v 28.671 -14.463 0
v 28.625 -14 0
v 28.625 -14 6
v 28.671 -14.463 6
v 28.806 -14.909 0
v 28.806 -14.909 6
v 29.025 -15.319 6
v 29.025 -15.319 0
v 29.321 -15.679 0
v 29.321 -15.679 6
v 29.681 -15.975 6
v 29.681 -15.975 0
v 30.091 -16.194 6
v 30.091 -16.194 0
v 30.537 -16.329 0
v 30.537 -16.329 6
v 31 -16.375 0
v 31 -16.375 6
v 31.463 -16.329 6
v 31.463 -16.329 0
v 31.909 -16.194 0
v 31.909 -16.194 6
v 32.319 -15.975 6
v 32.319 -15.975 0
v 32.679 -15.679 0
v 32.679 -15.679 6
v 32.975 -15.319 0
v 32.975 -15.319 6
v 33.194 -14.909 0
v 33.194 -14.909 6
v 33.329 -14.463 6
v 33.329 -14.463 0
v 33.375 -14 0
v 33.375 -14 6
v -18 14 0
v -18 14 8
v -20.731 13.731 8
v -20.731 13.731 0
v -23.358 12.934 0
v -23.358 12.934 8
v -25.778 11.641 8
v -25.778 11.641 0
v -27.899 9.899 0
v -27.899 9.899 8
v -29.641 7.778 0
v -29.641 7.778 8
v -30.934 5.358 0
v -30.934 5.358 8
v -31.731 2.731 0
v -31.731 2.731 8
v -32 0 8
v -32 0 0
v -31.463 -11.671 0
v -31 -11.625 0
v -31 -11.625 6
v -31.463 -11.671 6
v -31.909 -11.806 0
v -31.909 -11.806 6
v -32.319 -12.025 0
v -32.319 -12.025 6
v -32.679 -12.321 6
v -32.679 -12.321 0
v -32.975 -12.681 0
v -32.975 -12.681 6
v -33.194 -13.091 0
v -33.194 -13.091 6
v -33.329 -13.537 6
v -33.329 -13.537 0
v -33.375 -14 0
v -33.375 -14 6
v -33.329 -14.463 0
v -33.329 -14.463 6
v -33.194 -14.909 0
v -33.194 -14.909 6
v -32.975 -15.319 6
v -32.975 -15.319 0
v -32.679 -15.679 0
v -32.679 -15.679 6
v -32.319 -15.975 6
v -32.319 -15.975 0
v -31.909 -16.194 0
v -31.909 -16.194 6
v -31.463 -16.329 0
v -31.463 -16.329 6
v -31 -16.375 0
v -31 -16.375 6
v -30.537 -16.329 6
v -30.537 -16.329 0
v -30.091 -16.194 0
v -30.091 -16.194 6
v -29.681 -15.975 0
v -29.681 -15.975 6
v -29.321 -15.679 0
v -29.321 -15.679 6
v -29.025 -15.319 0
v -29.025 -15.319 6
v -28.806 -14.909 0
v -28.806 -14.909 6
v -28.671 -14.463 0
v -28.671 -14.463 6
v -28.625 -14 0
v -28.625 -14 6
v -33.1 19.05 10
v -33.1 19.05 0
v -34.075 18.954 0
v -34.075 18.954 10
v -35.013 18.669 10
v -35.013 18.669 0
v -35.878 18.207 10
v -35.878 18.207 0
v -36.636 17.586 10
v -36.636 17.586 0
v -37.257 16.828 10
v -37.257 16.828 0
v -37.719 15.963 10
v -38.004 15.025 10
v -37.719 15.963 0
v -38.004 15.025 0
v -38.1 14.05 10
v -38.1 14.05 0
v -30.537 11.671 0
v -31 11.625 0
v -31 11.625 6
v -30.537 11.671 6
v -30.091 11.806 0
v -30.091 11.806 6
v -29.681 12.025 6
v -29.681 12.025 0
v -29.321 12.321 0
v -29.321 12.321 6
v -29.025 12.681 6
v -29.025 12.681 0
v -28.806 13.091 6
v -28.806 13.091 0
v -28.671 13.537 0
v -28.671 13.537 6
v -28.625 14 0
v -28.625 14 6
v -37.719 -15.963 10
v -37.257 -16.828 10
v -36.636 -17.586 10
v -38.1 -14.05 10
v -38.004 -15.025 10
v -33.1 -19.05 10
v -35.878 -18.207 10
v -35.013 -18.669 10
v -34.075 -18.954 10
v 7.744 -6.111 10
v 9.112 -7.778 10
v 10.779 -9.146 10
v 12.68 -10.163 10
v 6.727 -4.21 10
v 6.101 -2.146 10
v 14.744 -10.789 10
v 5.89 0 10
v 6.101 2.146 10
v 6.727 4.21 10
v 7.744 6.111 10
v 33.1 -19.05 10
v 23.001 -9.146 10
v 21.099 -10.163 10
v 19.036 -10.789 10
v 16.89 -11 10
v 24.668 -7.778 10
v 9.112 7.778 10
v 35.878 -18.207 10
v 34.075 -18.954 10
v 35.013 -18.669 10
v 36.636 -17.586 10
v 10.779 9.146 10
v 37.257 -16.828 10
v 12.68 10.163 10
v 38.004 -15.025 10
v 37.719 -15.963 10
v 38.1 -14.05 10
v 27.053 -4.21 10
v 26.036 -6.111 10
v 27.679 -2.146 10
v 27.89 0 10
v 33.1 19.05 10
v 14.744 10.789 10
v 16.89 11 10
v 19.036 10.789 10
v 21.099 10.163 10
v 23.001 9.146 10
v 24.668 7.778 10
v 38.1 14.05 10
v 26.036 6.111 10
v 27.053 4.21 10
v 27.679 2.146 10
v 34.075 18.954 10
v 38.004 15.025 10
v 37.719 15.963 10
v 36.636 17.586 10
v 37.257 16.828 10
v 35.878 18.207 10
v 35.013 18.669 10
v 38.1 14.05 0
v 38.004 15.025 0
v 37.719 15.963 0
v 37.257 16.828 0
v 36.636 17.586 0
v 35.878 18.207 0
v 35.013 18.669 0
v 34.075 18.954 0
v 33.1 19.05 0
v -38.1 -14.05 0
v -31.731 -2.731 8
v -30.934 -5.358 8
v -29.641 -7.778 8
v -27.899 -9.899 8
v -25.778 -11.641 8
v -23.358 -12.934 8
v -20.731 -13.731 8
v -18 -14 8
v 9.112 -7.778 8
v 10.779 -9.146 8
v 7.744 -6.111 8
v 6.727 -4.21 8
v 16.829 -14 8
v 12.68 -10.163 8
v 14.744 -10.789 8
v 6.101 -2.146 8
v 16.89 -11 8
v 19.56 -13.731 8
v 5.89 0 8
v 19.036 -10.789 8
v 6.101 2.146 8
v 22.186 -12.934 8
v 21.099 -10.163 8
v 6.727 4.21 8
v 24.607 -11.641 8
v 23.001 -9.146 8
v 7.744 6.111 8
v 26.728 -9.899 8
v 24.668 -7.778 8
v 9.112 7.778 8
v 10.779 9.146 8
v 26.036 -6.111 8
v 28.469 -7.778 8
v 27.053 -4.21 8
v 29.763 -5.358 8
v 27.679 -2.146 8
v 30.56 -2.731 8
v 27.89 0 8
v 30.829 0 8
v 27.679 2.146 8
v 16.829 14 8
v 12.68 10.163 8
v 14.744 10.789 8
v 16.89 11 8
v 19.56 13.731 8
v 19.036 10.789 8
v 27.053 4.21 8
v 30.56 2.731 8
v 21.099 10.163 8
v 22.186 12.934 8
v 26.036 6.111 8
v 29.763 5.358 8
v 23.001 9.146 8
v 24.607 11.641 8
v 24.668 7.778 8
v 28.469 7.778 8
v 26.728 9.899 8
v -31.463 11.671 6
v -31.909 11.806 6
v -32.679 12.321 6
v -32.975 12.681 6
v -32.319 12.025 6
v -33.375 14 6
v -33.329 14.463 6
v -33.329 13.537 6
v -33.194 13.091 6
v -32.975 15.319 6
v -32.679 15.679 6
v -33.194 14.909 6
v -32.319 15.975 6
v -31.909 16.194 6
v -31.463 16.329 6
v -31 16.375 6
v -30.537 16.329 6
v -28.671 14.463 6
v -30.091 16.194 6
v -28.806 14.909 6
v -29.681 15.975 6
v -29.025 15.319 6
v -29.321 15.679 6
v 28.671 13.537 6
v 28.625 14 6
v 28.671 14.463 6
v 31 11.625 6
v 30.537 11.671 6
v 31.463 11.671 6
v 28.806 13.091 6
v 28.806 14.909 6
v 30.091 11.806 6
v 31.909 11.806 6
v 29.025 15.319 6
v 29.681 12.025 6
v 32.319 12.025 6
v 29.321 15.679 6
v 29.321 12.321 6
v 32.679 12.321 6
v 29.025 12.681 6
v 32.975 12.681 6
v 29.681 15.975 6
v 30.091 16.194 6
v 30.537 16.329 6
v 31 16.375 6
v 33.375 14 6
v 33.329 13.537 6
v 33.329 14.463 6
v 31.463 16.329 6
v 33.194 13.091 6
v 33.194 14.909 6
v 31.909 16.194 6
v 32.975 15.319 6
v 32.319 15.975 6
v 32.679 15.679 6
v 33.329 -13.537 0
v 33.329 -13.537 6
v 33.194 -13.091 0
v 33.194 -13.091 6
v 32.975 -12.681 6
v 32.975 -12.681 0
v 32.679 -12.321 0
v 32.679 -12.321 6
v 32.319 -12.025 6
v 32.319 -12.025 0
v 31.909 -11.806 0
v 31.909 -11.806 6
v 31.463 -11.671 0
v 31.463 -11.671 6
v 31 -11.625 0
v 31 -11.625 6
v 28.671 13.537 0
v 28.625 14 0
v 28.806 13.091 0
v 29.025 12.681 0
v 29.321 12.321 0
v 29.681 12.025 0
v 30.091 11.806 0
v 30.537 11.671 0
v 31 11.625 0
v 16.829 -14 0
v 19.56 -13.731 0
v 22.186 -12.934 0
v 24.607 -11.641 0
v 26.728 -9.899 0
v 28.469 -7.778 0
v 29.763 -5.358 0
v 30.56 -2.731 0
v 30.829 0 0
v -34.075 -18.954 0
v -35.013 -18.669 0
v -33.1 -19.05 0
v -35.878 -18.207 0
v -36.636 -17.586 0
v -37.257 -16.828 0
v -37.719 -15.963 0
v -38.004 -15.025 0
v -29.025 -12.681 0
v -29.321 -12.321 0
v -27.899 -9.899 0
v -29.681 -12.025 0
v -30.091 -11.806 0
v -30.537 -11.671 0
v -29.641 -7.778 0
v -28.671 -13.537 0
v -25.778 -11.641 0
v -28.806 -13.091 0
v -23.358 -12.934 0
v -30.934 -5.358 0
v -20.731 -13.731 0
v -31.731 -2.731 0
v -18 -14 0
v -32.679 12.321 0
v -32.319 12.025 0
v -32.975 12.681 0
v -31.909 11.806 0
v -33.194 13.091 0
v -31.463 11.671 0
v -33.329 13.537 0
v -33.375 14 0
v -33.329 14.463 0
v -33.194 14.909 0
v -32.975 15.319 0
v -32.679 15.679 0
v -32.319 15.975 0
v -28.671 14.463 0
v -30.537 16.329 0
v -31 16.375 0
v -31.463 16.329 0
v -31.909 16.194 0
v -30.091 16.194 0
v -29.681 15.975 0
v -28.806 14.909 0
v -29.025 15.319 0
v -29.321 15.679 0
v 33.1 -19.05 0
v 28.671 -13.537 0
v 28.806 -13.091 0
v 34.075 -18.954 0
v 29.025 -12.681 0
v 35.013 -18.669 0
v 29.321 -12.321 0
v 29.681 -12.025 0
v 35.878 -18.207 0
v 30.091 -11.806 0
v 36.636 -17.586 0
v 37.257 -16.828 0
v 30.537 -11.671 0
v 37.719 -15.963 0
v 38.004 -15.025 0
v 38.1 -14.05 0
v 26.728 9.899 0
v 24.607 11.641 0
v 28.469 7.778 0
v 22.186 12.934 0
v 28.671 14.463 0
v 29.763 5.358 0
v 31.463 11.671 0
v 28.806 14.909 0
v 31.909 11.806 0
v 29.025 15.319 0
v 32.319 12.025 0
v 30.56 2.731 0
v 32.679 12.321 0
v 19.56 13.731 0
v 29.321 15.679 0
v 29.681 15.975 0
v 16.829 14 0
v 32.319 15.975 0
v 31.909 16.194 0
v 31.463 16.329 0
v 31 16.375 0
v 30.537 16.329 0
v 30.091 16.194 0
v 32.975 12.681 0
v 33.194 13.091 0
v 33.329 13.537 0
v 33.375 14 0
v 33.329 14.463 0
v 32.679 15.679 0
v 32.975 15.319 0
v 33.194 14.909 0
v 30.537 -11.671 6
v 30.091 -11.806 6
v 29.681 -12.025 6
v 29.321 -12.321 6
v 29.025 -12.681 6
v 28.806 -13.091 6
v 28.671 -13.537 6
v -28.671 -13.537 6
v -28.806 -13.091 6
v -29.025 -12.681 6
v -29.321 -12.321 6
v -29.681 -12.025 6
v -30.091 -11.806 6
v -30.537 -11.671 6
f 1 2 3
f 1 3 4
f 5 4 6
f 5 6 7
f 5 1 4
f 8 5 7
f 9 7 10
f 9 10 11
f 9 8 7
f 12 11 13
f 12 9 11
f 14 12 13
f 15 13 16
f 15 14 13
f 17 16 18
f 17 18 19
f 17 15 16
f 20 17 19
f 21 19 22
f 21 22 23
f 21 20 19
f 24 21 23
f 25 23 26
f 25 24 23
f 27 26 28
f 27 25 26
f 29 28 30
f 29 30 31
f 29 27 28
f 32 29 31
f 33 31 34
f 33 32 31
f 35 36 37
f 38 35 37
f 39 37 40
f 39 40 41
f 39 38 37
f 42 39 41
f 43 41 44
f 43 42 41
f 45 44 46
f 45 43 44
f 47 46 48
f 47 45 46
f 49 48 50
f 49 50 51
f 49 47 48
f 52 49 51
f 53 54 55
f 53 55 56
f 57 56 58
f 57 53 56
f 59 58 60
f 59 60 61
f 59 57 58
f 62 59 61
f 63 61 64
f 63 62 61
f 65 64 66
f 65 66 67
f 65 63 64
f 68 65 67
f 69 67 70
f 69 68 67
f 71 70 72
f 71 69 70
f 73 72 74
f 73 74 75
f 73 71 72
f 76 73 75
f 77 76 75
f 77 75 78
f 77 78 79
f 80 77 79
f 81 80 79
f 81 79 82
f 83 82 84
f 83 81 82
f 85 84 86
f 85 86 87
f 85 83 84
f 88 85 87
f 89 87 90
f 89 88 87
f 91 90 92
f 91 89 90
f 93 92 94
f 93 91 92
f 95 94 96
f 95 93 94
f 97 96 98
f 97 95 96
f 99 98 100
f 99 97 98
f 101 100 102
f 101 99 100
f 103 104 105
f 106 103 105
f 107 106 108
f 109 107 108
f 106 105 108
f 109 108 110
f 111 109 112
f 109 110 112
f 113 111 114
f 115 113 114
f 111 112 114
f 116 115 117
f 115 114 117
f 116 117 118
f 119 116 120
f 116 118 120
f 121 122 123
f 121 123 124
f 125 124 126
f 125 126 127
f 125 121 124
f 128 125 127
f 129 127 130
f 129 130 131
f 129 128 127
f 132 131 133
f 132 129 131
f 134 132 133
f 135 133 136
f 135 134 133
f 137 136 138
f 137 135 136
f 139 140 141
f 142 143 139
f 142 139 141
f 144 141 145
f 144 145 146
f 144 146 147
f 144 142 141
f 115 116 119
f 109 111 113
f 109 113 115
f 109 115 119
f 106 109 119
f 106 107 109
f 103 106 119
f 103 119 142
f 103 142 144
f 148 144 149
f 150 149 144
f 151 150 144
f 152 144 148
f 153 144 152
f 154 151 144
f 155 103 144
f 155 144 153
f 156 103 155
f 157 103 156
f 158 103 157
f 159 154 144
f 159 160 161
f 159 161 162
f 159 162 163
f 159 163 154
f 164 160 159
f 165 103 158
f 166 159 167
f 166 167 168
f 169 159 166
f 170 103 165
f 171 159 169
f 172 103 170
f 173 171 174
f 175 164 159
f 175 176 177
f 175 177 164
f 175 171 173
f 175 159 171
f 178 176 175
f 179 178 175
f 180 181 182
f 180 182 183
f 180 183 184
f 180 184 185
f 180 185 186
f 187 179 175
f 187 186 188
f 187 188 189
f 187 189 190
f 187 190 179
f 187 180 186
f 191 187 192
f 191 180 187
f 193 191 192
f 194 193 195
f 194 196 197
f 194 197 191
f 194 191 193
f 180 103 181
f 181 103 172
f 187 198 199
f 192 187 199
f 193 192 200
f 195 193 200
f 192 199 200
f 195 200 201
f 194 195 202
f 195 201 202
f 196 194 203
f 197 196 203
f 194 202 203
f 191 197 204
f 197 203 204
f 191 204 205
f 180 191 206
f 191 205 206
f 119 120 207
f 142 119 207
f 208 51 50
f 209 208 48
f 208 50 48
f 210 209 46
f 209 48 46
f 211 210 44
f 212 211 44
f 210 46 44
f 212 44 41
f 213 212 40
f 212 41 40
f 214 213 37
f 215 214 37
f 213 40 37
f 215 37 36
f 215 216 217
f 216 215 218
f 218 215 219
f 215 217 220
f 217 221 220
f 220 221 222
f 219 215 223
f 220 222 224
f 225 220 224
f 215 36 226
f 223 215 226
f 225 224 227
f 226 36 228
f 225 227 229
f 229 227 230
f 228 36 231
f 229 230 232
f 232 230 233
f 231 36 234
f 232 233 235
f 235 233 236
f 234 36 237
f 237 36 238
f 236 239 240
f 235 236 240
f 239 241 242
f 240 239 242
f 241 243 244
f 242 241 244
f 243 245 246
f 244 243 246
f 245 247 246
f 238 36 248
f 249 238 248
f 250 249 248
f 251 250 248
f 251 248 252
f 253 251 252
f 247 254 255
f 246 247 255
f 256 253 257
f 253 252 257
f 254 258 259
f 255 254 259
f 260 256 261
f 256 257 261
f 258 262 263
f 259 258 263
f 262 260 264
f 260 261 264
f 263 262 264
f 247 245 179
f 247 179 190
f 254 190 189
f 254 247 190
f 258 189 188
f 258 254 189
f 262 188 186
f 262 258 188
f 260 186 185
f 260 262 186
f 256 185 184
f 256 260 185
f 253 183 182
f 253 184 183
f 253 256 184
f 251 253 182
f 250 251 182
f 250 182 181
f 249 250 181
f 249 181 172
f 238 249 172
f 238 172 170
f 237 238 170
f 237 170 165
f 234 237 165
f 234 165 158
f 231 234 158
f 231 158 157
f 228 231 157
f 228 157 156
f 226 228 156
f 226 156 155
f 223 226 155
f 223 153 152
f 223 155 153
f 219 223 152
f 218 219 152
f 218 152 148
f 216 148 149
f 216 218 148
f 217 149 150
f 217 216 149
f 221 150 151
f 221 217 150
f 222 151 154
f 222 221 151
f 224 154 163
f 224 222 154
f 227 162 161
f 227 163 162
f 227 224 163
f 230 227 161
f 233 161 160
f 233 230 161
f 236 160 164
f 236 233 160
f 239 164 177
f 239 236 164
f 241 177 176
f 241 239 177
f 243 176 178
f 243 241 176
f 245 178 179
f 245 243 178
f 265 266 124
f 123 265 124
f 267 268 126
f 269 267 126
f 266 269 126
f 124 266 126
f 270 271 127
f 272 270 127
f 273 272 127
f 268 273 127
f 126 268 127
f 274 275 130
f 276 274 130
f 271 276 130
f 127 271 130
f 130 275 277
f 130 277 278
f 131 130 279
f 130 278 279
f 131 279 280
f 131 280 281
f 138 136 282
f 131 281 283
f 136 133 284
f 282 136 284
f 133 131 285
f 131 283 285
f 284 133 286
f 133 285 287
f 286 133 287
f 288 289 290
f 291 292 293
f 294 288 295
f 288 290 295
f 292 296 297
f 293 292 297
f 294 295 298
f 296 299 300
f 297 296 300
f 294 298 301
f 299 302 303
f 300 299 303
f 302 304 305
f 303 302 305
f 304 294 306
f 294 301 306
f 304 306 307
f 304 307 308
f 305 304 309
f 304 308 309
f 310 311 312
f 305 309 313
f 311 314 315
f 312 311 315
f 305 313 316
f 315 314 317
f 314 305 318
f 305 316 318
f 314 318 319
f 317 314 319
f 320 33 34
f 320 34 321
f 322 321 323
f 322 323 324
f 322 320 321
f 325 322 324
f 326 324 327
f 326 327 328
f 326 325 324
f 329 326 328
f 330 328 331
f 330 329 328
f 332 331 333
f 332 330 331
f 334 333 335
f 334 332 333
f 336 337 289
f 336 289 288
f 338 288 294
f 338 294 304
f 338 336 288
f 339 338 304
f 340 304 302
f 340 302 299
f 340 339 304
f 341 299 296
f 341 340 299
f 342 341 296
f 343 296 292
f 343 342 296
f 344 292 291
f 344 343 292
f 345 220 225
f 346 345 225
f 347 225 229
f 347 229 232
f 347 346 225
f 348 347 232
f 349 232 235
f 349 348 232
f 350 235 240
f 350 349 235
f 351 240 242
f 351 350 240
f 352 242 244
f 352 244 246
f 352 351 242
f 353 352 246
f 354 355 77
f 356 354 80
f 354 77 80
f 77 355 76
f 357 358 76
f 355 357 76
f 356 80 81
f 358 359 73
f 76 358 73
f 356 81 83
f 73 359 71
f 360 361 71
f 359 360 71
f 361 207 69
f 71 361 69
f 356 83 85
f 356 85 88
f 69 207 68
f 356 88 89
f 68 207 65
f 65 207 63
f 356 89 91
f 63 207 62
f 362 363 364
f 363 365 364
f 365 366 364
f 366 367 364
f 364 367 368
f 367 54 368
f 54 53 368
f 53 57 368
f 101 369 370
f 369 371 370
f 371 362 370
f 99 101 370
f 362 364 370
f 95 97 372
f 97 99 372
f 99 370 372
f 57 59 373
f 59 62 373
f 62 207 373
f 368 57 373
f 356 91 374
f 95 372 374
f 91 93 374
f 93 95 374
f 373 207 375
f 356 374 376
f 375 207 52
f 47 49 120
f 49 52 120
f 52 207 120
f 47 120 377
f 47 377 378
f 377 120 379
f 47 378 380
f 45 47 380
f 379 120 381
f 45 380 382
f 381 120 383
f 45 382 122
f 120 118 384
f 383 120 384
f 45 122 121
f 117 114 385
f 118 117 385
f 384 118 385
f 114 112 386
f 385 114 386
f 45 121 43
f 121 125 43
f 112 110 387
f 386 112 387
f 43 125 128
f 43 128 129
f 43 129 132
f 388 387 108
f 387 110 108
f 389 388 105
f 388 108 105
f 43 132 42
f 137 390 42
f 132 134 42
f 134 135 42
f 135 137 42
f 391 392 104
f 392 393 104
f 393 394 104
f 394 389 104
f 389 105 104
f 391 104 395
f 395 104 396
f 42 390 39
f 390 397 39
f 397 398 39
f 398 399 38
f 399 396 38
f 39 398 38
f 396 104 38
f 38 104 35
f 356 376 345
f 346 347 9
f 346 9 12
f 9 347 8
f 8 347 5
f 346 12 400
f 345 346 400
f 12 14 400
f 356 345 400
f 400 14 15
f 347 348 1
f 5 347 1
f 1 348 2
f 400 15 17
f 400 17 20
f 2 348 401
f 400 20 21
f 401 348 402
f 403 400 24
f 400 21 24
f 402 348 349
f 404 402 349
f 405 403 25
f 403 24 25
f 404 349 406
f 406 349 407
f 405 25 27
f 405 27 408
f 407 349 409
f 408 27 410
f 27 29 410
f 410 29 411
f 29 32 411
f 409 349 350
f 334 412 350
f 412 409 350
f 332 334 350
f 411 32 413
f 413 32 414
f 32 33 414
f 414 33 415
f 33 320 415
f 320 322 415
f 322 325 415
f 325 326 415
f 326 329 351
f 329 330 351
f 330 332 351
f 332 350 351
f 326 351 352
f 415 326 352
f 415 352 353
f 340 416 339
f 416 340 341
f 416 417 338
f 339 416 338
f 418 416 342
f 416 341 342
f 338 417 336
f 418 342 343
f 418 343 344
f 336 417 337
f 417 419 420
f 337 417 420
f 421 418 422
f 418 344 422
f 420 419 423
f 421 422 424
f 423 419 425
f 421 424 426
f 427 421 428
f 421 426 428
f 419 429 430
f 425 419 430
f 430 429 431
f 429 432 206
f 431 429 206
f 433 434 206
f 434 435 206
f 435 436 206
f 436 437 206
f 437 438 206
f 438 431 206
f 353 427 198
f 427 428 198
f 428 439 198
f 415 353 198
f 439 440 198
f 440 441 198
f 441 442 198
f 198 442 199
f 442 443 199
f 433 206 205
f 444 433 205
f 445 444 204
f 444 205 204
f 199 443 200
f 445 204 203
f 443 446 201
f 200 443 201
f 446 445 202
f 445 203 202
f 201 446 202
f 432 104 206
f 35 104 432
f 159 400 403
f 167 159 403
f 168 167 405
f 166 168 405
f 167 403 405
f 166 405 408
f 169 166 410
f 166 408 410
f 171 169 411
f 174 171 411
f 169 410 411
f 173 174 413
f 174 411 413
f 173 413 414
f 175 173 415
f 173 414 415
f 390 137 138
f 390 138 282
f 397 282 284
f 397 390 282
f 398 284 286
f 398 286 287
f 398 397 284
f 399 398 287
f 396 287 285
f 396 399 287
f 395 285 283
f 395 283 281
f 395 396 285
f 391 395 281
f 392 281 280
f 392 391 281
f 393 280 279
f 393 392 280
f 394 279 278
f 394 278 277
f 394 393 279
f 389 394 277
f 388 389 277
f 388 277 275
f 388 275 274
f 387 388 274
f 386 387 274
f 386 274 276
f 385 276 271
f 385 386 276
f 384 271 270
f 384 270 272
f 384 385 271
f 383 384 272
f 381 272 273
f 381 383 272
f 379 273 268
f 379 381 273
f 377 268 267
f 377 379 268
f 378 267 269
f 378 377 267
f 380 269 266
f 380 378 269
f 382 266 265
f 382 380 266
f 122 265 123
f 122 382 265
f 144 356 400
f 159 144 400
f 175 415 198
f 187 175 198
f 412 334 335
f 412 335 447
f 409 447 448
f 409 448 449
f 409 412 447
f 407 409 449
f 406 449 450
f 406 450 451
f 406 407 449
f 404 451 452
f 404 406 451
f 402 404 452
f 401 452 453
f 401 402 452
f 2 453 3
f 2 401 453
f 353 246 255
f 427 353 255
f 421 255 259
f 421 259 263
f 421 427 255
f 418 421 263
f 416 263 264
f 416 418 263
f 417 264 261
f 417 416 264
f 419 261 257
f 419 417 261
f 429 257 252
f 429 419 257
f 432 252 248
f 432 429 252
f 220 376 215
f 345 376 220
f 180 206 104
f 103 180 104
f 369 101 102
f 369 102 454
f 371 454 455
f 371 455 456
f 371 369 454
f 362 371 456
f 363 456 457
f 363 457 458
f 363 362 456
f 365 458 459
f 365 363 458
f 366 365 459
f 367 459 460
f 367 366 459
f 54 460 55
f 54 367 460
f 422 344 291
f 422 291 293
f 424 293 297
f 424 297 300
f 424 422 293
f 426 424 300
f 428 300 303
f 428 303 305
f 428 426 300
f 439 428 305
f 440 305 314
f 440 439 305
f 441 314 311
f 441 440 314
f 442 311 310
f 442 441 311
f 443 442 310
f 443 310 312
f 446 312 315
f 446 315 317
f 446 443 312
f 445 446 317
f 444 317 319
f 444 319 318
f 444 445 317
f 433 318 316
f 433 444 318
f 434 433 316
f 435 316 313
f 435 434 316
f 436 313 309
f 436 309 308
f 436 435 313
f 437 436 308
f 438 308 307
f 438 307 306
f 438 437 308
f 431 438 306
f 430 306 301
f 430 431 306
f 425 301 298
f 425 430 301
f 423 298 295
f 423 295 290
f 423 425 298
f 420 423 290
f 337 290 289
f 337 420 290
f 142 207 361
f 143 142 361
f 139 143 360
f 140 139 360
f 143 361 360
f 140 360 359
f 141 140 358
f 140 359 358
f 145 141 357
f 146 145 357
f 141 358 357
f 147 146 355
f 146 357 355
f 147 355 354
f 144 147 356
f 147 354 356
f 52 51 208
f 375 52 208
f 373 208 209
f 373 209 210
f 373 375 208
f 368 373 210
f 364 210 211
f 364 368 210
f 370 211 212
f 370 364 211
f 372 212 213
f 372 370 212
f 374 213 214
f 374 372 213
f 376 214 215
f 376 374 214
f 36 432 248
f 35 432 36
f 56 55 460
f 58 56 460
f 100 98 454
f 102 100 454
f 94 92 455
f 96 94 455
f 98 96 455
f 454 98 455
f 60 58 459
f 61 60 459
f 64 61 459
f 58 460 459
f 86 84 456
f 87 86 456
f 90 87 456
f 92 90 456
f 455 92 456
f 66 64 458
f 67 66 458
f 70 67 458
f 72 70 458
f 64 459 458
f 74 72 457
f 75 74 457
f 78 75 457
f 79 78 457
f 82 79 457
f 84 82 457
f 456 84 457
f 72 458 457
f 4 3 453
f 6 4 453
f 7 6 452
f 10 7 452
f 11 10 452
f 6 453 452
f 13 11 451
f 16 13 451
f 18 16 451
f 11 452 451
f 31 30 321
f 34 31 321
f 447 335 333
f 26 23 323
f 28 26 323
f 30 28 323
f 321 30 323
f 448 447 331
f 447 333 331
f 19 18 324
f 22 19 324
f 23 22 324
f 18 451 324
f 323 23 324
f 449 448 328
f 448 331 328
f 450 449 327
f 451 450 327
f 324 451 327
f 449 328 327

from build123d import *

# Parameters (mm, degrees)
F1_DEPTH = 10
F2_R     = 11
F3_DEPTH = 20
F5_DEPTH = 6
F7_DEPTH = 8


# Not quite as in the source:
# - a feature names something its author has since deleted; it is built from what else it names


with BuildPart() as f1:
    # F0 (on Top) → F1 (new body)
    with BuildSketch(Plane.XY):
        with BuildLine():
            Line((33.1, 19.05), (-33.1, 19.05))
            ThreePointArc((-33.1, 19.05), (-36.6355339059, 17.5855339059), (-38.1, 14.05))
            Line((-38.1, 14.05), (-38.1, -14.05))
            ThreePointArc((-38.1, -14.05), (-36.6355339059, -17.5855339059), (-33.1, -19.05))
            Line((-33.1, -19.05), (33.1, -19.05))
            ThreePointArc((33.1, -19.05), (36.6355339059, -17.5855339059), (38.1, -14.05))
            Line((38.1, -14.05), (38.1, 14.05))
            ThreePointArc((38.1, 14.05), (36.6355339059, 17.5855339059), (33.1, 19.05))
        make_face()
    extrude(amount=F1_DEPTH)

    # F2 (on Top) → F3 (cut)
    with BuildSketch(Plane.XY):
        with Locations((16.8899707496, 0)):
            Circle(F2_R)
    extrude(amount=F3_DEPTH, mode=Mode.SUBTRACT)

    # F4 (on Top) → F5 (cut)
    with BuildSketch(Plane.XY):
        with BuildLine():
            Line((31, -14), (31, -11.625))
            ThreePointArc((31, -11.625), (29.3206213947, -12.3206213947), (28.625, -14))
            Line((28.625, -14), (31, -14))
        make_face()
        with BuildLine():
            ThreePointArc((33.375, -14), (32.6793786053, -12.3206213947), (31, -11.625))
            Line((31, -11.625), (31, -14))
            Line((31, -14), (28.625, -14))
            ThreePointArc((28.625, -14), (31, -16.375), (33.375, -14))
        make_face()
        with BuildLine():
            ThreePointArc((-28.625, -14), (-29.3206213947, -12.3206213947), (-31, -11.625))
            Line((-31, -11.625), (-31, -14))
            Line((-31, -14), (-28.625, -14))
        make_face()
        with BuildLine():
            Line((-31, -14), (-31, -11.625))
            ThreePointArc((-31, -11.625), (-32.6793786053, -15.6793786053), (-28.625, -14))
            Line((-28.625, -14), (-31, -14))
        make_face()
        with BuildLine():
            Line((-31, 14), (-28.625, 14))
            ThreePointArc((-28.625, 14), (-32.6793786053, 15.6793786053), (-31, 11.625))
            Line((-31, 11.625), (-31, 14))
        make_face()
        with BuildLine():
            ThreePointArc((-31, 11.625), (-29.3206213947, 12.3206213947), (-28.625, 14))
            Line((-28.625, 14), (-31, 14))
            Line((-31, 14), (-31, 11.625))
        make_face()
        with BuildLine():
            Line((31, 14), (28.625, 14))
            ThreePointArc((28.625, 14), (29.3206213947, 12.3206213947), (31, 11.625))
            Line((31, 11.625), (31, 14))
        make_face()
        with BuildLine():
            ThreePointArc((33.375, 14), (31, 16.375), (28.625, 14))
            Line((28.625, 14), (31, 14))
            Line((31, 14), (31, 11.625))
            ThreePointArc((31, 11.625), (32.6793786053, 12.3206213947), (33.375, 14))
        make_face()
    extrude(amount=F5_DEPTH, mode=Mode.SUBTRACT)

    # F6 (on Top) → F7 (cut)
    with BuildSketch(Plane.XY):
        with BuildLine():
            Line((16.8287921697, 14), (-18, 14))
            ThreePointArc((-18, 14), (-27.8994949366, 9.8994949366), (-32, 0))
            ThreePointArc((-32, 0), (-27.8994949366, -9.8994949366), (-18, -14))
            Line((-18, -14), (16.8287921697, -14))
            ThreePointArc((16.8287921697, -14), (26.7282871063, -9.8994949366), (30.8287921697, 0))
            ThreePointArc((30.8287921697, 0), (26.7282871063, 9.8994949366), (16.8287921697, 14))
        make_face()
    extrude(amount=F7_DEPTH, mode=Mode.SUBTRACT)


solid = f1.part
